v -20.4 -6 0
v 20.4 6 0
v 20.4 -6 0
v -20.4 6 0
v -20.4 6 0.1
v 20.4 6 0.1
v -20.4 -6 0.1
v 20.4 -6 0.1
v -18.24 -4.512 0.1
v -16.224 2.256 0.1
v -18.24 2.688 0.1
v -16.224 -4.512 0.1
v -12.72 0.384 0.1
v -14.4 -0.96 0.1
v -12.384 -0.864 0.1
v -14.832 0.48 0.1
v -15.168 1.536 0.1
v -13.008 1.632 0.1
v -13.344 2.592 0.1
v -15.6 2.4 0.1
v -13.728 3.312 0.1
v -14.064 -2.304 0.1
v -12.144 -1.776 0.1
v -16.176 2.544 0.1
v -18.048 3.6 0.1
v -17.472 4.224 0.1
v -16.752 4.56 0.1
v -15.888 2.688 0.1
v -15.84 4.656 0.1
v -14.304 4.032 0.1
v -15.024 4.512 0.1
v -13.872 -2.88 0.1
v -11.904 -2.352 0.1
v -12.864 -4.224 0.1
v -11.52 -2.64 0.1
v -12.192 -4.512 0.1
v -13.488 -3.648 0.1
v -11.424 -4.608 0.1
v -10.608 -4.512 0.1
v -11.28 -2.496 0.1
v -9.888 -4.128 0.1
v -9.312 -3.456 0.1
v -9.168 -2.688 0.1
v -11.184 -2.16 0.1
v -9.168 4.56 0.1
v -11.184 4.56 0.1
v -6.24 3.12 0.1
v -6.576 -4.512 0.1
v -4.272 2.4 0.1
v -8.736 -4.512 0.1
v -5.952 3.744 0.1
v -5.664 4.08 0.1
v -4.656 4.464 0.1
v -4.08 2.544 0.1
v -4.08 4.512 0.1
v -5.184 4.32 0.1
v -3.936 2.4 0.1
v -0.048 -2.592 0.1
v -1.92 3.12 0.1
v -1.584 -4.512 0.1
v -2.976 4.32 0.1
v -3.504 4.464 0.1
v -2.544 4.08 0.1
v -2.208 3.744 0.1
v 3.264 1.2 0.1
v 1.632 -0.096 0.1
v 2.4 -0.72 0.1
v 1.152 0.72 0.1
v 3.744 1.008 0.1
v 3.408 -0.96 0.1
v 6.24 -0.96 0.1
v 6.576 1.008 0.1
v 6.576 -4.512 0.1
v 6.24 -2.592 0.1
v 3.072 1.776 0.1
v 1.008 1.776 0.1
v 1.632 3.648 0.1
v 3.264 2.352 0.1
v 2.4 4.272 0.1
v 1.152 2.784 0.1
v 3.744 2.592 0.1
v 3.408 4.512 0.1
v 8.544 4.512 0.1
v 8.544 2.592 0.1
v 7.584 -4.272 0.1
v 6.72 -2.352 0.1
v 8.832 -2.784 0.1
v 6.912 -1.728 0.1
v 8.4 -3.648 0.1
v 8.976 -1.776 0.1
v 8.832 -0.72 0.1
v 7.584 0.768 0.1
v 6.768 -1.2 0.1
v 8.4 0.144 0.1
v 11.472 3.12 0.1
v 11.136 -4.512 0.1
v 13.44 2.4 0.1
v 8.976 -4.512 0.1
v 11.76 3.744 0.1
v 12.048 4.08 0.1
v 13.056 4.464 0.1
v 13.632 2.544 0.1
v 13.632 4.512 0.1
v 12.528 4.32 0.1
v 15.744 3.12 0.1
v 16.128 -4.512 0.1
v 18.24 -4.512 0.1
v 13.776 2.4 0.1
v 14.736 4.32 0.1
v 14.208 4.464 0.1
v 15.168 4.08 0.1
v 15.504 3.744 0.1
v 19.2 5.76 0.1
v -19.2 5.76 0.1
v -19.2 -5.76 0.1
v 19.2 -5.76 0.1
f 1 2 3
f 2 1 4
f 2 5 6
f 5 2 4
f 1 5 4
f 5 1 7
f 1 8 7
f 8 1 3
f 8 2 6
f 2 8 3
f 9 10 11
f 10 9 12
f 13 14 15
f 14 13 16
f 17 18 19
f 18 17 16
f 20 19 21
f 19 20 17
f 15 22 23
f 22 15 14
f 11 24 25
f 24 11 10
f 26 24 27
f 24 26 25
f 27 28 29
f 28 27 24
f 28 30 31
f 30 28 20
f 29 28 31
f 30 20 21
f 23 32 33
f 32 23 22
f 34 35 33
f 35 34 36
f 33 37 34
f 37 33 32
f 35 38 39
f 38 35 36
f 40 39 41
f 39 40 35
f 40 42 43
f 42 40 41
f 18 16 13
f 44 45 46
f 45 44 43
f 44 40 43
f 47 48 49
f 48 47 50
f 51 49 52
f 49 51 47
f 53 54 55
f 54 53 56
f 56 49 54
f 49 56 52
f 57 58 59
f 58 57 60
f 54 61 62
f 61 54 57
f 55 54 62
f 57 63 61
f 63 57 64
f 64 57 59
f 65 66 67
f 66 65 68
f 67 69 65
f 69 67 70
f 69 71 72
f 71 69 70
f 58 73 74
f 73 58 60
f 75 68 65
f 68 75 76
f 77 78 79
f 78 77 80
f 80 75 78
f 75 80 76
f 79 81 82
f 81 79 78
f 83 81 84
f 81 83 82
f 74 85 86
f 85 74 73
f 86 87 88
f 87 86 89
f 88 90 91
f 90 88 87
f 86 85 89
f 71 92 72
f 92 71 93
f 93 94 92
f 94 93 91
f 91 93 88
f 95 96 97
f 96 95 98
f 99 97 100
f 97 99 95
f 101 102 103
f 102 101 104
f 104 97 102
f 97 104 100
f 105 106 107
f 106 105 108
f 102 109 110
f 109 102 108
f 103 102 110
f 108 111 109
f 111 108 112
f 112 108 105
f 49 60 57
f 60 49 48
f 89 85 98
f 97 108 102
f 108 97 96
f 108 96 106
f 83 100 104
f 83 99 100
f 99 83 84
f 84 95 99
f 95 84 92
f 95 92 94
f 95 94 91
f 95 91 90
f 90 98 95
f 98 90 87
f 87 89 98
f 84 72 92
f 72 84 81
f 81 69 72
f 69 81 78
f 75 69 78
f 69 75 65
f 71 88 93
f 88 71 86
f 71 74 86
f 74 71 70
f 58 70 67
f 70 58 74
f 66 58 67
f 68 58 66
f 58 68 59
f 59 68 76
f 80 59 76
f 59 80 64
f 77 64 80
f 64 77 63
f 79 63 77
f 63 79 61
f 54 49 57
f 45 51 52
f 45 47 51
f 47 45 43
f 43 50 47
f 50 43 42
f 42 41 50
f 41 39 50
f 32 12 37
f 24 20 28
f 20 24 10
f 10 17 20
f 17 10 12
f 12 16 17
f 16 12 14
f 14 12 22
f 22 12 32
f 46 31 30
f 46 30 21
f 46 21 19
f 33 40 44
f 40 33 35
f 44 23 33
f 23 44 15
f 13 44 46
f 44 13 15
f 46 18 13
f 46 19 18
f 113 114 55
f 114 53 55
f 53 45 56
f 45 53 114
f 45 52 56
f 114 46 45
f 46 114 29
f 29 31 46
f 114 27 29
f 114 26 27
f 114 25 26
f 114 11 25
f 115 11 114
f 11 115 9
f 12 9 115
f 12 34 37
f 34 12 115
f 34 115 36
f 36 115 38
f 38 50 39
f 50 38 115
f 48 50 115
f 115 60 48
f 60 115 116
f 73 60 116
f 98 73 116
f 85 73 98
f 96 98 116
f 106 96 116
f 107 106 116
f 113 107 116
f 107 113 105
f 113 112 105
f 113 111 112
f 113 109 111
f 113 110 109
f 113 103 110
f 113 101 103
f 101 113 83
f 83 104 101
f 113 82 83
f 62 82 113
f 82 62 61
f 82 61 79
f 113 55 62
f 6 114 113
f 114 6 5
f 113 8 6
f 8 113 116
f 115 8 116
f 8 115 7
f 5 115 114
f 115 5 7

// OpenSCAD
// file: ../p/logo-nasa.scad
use <../lib.scad>
function ldraw_lib__logo_nasa() = [
// 0 Logo NASA Worm Logo
// 0 Name: logo-nasa.dat
// 0 Author: Takeshi Takahashi [RainbowDolphin]
// 0 !LDRAW_ORG Primitive UPDATE 2022-06
// 0 !LICENSE Licensed under CC BY 2.0 and CC BY 4.0 : see CAreadme.txt
// 
// 0 BFC CERTIFY CCW
  [0,"BFC","CERTIFY"],
  [0,"BFC","CCW"],
// 
// 0 !HISTORY 2022-04-22 [RainbowDolphin] Pattern extracted and resized from 10202p02 by Orion Pobursky [OrionP]
// 0 !HISTORY 2022-12-20 [PTadmin] Official Update 2022-06
// 
// 
// 4 16 -38 0 -9.4 -33.8 0 -9.4 -33.8 0 4.7 -38 0 5.6
  [4,16,-38,0,-9.4,-33.8,0,-9.4,-33.8,0,4.7,-38,0,5.6],
// 4 16 -26.5 0 .8 -30.9 0 1 -30 0 -2 -25.8 0 -1.8
  [4,16,-26.5,0,.8,-30.9,0,1,-30,0,-2,-25.8,0,-1.8],
// 4 16 -31.6 0 3.2 -30.9 0 1 -27.1 0 3.4 -27.8 0 5.4
  [4,16,-31.6,0,3.2,-30.9,0,1,-27.1,0,3.4,-27.8,0,5.4],
// 4 16 -32.5 0 5 -31.6 0 3.2 -27.8 0 5.4 -28.6 0 6.9
  [4,16,-32.5,0,5,-31.6,0,3.2,-27.8,0,5.4,-28.6,0,6.9],
// 4 16 -25.8 0 -1.8 -30 0 -2 -29.3 0 -4.8 -25.3 0 -3.7
  [4,16,-25.8,0,-1.8,-30,0,-2,-29.3,0,-4.8,-25.3,0,-3.7],
// 4 16 -33.7 0 5.3 -37.6 0 7.5 -38 0 5.6 -33.8 0 4.7
  [4,16,-33.7,0,5.3,-37.6,0,7.5,-38,0,5.6,-33.8,0,4.7],
// 4 16 -36.4 0 8.8 -37.6 0 7.5 -33.7 0 5.3 -34.9 0 9.5
  [4,16,-36.4,0,8.8,-37.6,0,7.5,-33.7,0,5.3,-34.9,0,9.5],
// 4 16 -34.9 0 9.5 -33.7 0 5.3 -33.1 0 5.6 -33 0 9.7
  [4,16,-34.9,0,9.5,-33.7,0,5.3,-33.1,0,5.6,-33,0,9.7],
// 4 16 -33.1 0 5.6 -32.5 0 5 -29.8 0 8.4 -31.3 0 9.4
  [4,16,-33.1,0,5.6,-32.5,0,5,-29.8,0,8.4,-31.3,0,9.4],
// 3 16 -33 0 9.7 -33.1 0 5.6 -31.3 0 9.4
  [3,16,-33,0,9.7,-33.1,0,5.6,-31.3,0,9.4],
// 3 16 -29.8 0 8.4 -32.5 0 5 -28.6 0 6.9
  [3,16,-29.8,0,8.4,-32.5,0,5,-28.6,0,6.9],
// 4 16 -25.3 0 -3.7 -29.3 0 -4.8 -28.9 0 -6 -24.8 0 -4.9
  [4,16,-25.3,0,-3.7,-29.3,0,-4.8,-28.9,0,-6,-24.8,0,-4.9],
// 4 16 -26.8 0 -8.8 -25.4 0 -9.4 -24 0 -5.5 -24.8 0 -4.9
  [4,16,-26.8,0,-8.8,-25.4,0,-9.4,-24,0,-5.5,-24.8,0,-4.9],
// 4 16 -28.1 0 -7.6 -26.8 0 -8.8 -24.8 0 -4.9 -28.9 0 -6
  [4,16,-28.1,0,-7.6,-26.8,0,-8.8,-24.8,0,-4.9,-28.9,0,-6],
// 4 16 -24 0 -5.5 -25.4 0 -9.4 -23.8 0 -9.6 -22.1 0 -9.4
  [4,16,-24,0,-5.5,-25.4,0,-9.4,-23.8,0,-9.6,-22.1,0,-9.4],
// 4 16 -23.5 0 -5.2 -24 0 -5.5 -22.1 0 -9.4 -20.6 0 -8.6
  [4,16,-23.5,0,-5.2,-24,0,-5.5,-22.1,0,-9.4,-20.6,0,-8.6],
// 4 16 -23.5 0 -5.2 -20.6 0 -8.6 -19.4 0 -7.2 -19.1 0 -5.6
  [4,16,-23.5,0,-5.2,-20.6,0,-8.6,-19.4,0,-7.2,-19.1,0,-5.6],
// 3 16 -27.1 0 3.4 -30.9 0 1 -26.5 0 .8
  [3,16,-27.1,0,3.4,-30.9,0,1,-26.5,0,.8],
// 4 16 -19.1 0 9.5 -23.3 0 9.5 -23.3 0 -4.5 -19.1 0 -5.6
  [4,16,-19.1,0,9.5,-23.3,0,9.5,-23.3,0,-4.5,-19.1,0,-5.6],
// 3 16 -23.3 0 -4.5 -23.5 0 -5.2 -19.1 0 -5.6
  [3,16,-23.3,0,-4.5,-23.5,0,-5.2,-19.1,0,-5.6],
// 4 16 -13 0 6.5 -18.2 0 -9.4 -13.7 0 -9.4 -8.9 0 5
  [4,16,-13,0,6.5,-18.2,0,-9.4,-13.7,0,-9.4,-8.9,0,5],
// 4 16 -8.9 0 5 -11.8 0 8.5 -12.4 0 7.8 -13 0 6.5
  [4,16,-8.9,0,5,-11.8,0,8.5,-12.4,0,7.8,-13,0,6.5],
// 4 16 -9.7 0 9.3 -10.8 0 9 -8.5 0 5.3 -8.5 0 9.4
  [4,16,-9.7,0,9.3,-10.8,0,9,-8.5,0,5.3,-8.5,0,9.4],
// 4 16 -10.8 0 9 -11.8 0 8.5 -8.9 0 5 -8.5 0 5.3
  [4,16,-10.8,0,9,-11.8,0,8.5,-8.9,0,5,-8.5,0,5.3],
// 4 16 -3.3 0 -9.4 -.1 0 -5.4 -4 0 6.5 -8.2 0 5
  [4,16,-3.3,0,-9.4,-.1,0,-5.4,-4,0,6.5,-8.2,0,5],
// 4 16 -6.2 0 9 -7.3 0 9.3 -8.5 0 5.3 -8.2 0 5
  [4,16,-6.2,0,9,-7.3,0,9.3,-8.5,0,5.3,-8.2,0,5],
// 3 16 -8.5 0 9.4 -8.5 0 5.3 -7.3 0 9.3
  [3,16,-8.5,0,9.4,-8.5,0,5.3,-7.3,0,9.3],
// 4 16 -8.2 0 5 -4.6 0 7.8 -5.3 0 8.5 -6.2 0 9
  [4,16,-8.2,0,5,-4.6,0,7.8,-5.3,0,8.5,-6.2,0,9],
// 3 16 -4.6 0 7.8 -8.2 0 5 -4 0 6.5
  [3,16,-4.6,0,7.8,-8.2,0,5,-4,0,6.5],
// 4 16 6.8 0 2.5 2.4 0 1.5 3.4 0 -.2 5 0 -1.5
  [4,16,6.8,0,2.5,2.4,0,1.5,3.4,0,-.2,5,0,-1.5],
// 4 16 5 0 -1.5 7.1 0 -2 7.8 0 2.1 6.8 0 2.5
  [4,16,5,0,-1.5,7.1,0,-2,7.8,0,2.1,6.8,0,2.5],
// 4 16 7.8 0 2.1 7.1 0 -2 13 0 -2 13.7 0 2.1
  [4,16,7.8,0,2.1,7.1,0,-2,13,0,-2,13.7,0,2.1],
// 4 16 13 0 -5.4 -.1 0 -5.4 -3.3 0 -9.4 13.7 0 -9.4
  [4,16,13,0,-5.4,-.1,0,-5.4,-3.3,0,-9.4,13.7,0,-9.4],
// 4 16 2.4 0 1.5 6.8 0 2.5 6.4 0 3.7 2.1 0 3.7
  [4,16,2.4,0,1.5,6.8,0,2.5,6.4,0,3.7,2.1,0,3.7],
// 4 16 3.4 0 7.6 2.4 0 5.8 6.8 0 4.9 5 0 8.9
  [4,16,3.4,0,7.6,2.4,0,5.8,6.8,0,4.9,5,0,8.9],
// 4 16 2.4 0 5.8 2.1 0 3.7 6.4 0 3.7 6.8 0 4.9
  [4,16,2.4,0,5.8,2.1,0,3.7,6.4,0,3.7,6.8,0,4.9],
// 4 16 5 0 8.9 6.8 0 4.9 7.8 0 5.4 7.1 0 9.4
  [4,16,5,0,8.9,6.8,0,4.9,7.8,0,5.4,7.1,0,9.4],
// 4 16 17.8 0 9.4 7.1 0 9.4 7.8 0 5.4 17.8 0 5.4
  [4,16,17.8,0,9.4,7.1,0,9.4,7.8,0,5.4,17.8,0,5.4],
// 4 16 15.8 0 -8.9 14 0 -4.9 13 0 -5.4 13.7 0 -9.4
  [4,16,15.8,0,-8.9,14,0,-4.9,13,0,-5.4,13.7,0,-9.4],
// 4 16 18.4 0 -5.8 14.4 0 -3.6 14 0 -4.9 17.5 0 -7.6
  [4,16,18.4,0,-5.8,14.4,0,-3.6,14,0,-4.9,17.5,0,-7.6],
// 4 16 14.4 0 -3.6 18.4 0 -5.8 18.7 0 -3.7 18.4 0 -1.5
  [4,16,14.4,0,-3.6,18.4,0,-5.8,18.7,0,-3.7,18.4,0,-1.5],
// 3 16 14 0 -4.9 15.8 0 -8.9 17.5 0 -7.6
  [3,16,14,0,-4.9,15.8,0,-8.9,17.5,0,-7.6],
// 4 16 13 0 -2 14.1 0 -2.5 15.8 0 1.6 13.7 0 2.1
  [4,16,13,0,-2,14.1,0,-2.5,15.8,0,1.6,13.7,0,2.1],
// 4 16 17.5 0 .3 15.8 0 1.6 14.1 0 -2.5 18.4 0 -1.5
  [4,16,17.5,0,.3,15.8,0,1.6,14.1,0,-2.5,18.4,0,-1.5],
// 3 16 18.4 0 -1.5 14.1 0 -2.5 14.4 0 -3.6
  [3,16,18.4,0,-1.5,14.1,0,-2.5,14.4,0,-3.6],
// 4 16 23.9 0 6.5 18.7 0 -9.4 23.2 0 -9.4 28 0 5
  [4,16,23.9,0,6.5,18.7,0,-9.4,23.2,0,-9.4,28,0,5],
// 4 16 28 0 5 25.1 0 8.5 24.5 0 7.8 23.9 0 6.5
  [4,16,28,0,5,25.1,0,8.5,24.5,0,7.8,23.9,0,6.5],
// 4 16 27.2 0 9.3 26.1 0 9 28.4 0 5.3 28.4 0 9.4
  [4,16,27.2,0,9.3,26.1,0,9,28.4,0,5.3,28.4,0,9.4],
// 4 16 26.1 0 9 25.1 0 8.5 28 0 5 28.4 0 5.3
  [4,16,26.1,0,9,25.1,0,8.5,28,0,5,28.4,0,5.3],
// 4 16 33.6 0 -9.4 38 0 -9.4 32.8 0 6.5 28.7 0 5
  [4,16,33.6,0,-9.4,38,0,-9.4,32.8,0,6.5,28.7,0,5],
// 4 16 30.7 0 9 29.6 0 9.3 28.4 0 5.3 28.7 0 5
  [4,16,30.7,0,9,29.6,0,9.3,28.4,0,5.3,28.7,0,5],
// 3 16 28.4 0 9.4 28.4 0 5.3 29.6 0 9.3
  [3,16,28.4,0,9.4,28.4,0,5.3,29.6,0,9.3],
// 4 16 28.7 0 5 32.299 0 7.8 31.6 0 8.5 30.7 0 9
  [4,16,28.7,0,5,32.299,0,7.8,31.6,0,8.5,30.7,0,9],
// 3 16 32.299 0 7.8 28.7 0 5 32.8 0 6.5
  [3,16,32.299,0,7.8,28.7,0,5,32.8,0,6.5],
];
makepoly(ldraw_lib__logo_nasa(), line=0.2);
// file: ../p/logo-nasa-bg.scad
use <../lib.scad>
function ldraw_lib__logo_nasa_bg() = [
// 0 Logo NASA Worm Logo Background
// 0 Name: logo-nasa-bg.dat
// 0 Author: Takeshi Takahashi [RainbowDolphin]
// 0 !LDRAW_ORG Primitive UPDATE 2022-06
// 0 !LICENSE Licensed under CC BY 2.0 and CC BY 4.0 : see CAreadme.txt
// 
// 0 BFC CERTIFY CCW
  [0,"BFC","CERTIFY"],
  [0,"BFC","CCW"],
// 
// 0 !HISTORY 2022-04-22 [RainbowDolphin] Pattern extracted and resized from 10202p02 by Orion Pobursky [OrionP]
// 0 !HISTORY 2022-12-20 [PTadmin] Official Update 2022-06
// 
// 
// 4 16 -13.7 0 -9.4 -3.3 0 -9.4 -8.2 0 5 -8.9 0 5
  [4,16,-13.7,0,-9.4,-3.3,0,-9.4,-8.2,0,5,-8.9,0,5],
// 3 16 17.5 0 -7.6 15.8 0 -8.9 18.7 0 -9.4
  [3,16,17.5,0,-7.6,15.8,0,-8.9,18.7,0,-9.4],
// 4 16 28.7 0 5 28.4 0 5.3 28 0 5 23.2 0 -9.4
  [4,16,28.7,0,5,28.4,0,5.3,28,0,5,23.2,0,-9.4],
// 3 16 28.7 0 5 23.2 0 -9.4 33.6 0 -9.4
  [3,16,28.7,0,5,23.2,0,-9.4,33.6,0,-9.4],
// 3 16 17.8 0 9.4 25.1 0 8.5 26.1 0 9
  [3,16,17.8,0,9.4,25.1,0,8.5,26.1,0,9],
// 4 16 24.5 0 7.8 25.1 0 8.5 17.8 0 9.4 17.8 0 5.4
  [4,16,24.5,0,7.8,25.1,0,8.5,17.8,0,9.4,17.8,0,5.4],
// 4 16 23.9 0 6.5 24.5 0 7.8 17.8 0 5.4 15.8 0 1.6
  [4,16,23.9,0,6.5,24.5,0,7.8,17.8,0,5.4,15.8,0,1.6],
// 3 16 23.9 0 6.5 15.8 0 1.6 17.5 0 0.3
  [3,16,23.9,0,6.5,15.8,0,1.6,17.5,0,0.3],
// 3 16 23.9 0 6.5 17.5 0 0.3 18.4 0 -1.5
  [3,16,23.9,0,6.5,17.5,0,0.3,18.4,0,-1.5],
// 3 16 23.9 0 6.5 18.4 0 -1.5 18.7 0 -3.7
  [3,16,23.9,0,6.5,18.4,0,-1.5,18.7,0,-3.7],
// 4 16 23.9 0 6.5 18.7 0 -3.7 18.4 0 -5.8 18.7 0 -9.4
  [4,16,23.9,0,6.5,18.7,0,-3.7,18.4,0,-5.8,18.7,0,-9.4],
// 3 16 18.4 0 -5.8 17.5 0 -7.6 18.7 0 -9.4
  [3,16,18.4,0,-5.8,17.5,0,-7.6,18.7,0,-9.4],
// 4 16 13.7 0 2.1 15.8 0 1.6 17.8 0 5.4 7.8 0 5.4
  [4,16,13.7,0,2.1,15.8,0,1.6,17.8,0,5.4,7.8,0,5.4],
// 4 16 7.8 0 2.1 13.7 0 2.1 7.8 0 5.4 6.8 0 4.9
  [4,16,7.8,0,2.1,13.7,0,2.1,7.8,0,5.4,6.8,0,4.9],
// 4 16 6.8 0 2.5 7.8 0 2.1 6.8 0 4.9 6.4 0 3.7
  [4,16,6.8,0,2.5,7.8,0,2.1,6.8,0,4.9,6.4,0,3.7],
// 4 16 14 0 -4.9 14.4 0 -3.6 14.1 0 -2.5 13 0 -2
  [4,16,14,0,-4.9,14.4,0,-3.6,14.1,0,-2.5,13,0,-2],
// 4 16 13 0 -5.4 14 0 -4.9 13 0 -2 7.1 0 -2
  [4,16,13,0,-5.4,14,0,-4.9,13,0,-2,7.1,0,-2],
// 4 16 -0.1 0 -5.4 13 0 -5.4 7.1 0 -2 5 0 -1.5
  [4,16,-0.1,0,-5.4,13,0,-5.4,7.1,0,-2,5,0,-1.5],
// 3 16 3.4 0 -0.2 -0.1 0 -5.4 5 0 -1.5
  [3,16,3.4,0,-0.2,-0.1,0,-5.4,5,0,-1.5],
// 4 16 2.4 0 1.5 -4 0 6.5 -0.1 0 -5.4 3.4 0 -0.2
  [4,16,2.4,0,1.5,-4,0,6.5,-0.1,0,-5.4,3.4,0,-0.2],
// 3 16 -4 0 6.5 2.4 0 1.5 2.1 0 3.7
  [3,16,-4,0,6.5,2.4,0,1.5,2.1,0,3.7],
// 4 16 -4 0 6.5 2.1 0 3.7 2.4 0 5.8 -4.6 0 7.8
  [4,16,-4,0,6.5,2.1,0,3.7,2.4,0,5.8,-4.6,0,7.8],
// 4 16 -4.6 0 7.8 2.4 0 5.8 3.4 0 7.6 -5.3 0 8.5
  [4,16,-4.6,0,7.8,2.4,0,5.8,3.4,0,7.6,-5.3,0,8.5],
// 4 16 -5.3 0 8.5 3.4 0 7.6 5 0 8.9 -6.2 0 9
  [4,16,-5.3,0,8.5,3.4,0,7.6,5,0,8.9,-6.2,0,9],
// 3 16 -8.5 0 5.3 -8.9 0 5 -8.2 0 5
  [3,16,-8.5,0,5.3,-8.9,0,5,-8.2,0,5],
// 3 16 -19.1 0 9.5 -12.4 0 7.8 -11.8 0 8.5
  [3,16,-19.1,0,9.5,-12.4,0,7.8,-11.8,0,8.5],
// 4 16 -13 0 6.5 -12.4 0 7.8 -19.1 0 9.5 -19.1 0 -5.6
  [4,16,-13,0,6.5,-12.4,0,7.8,-19.1,0,9.5,-19.1,0,-5.6],
// 4 16 -18.2 0 -9.4 -13 0 6.5 -19.1 0 -5.6 -19.4 0 -7.2
  [4,16,-18.2,0,-9.4,-13,0,6.5,-19.1,0,-5.6,-19.4,0,-7.2],
// 3 16 -19.4 0 -7.2 -20.6 0 -8.6 -18.2 0 -9.4
  [3,16,-19.4,0,-7.2,-20.6,0,-8.6,-18.2,0,-9.4],
// 3 16 -20.6 0 -8.6 -22.1 0 -9.4 -18.2 0 -9.4
  [3,16,-20.6,0,-8.6,-22.1,0,-9.4,-18.2,0,-9.4],
// 3 16 -28.9 0 -6 -33.8 0 -9.4 -28.1 0 -7.6
  [3,16,-28.9,0,-6,-33.8,0,-9.4,-28.1,0,-7.6],
// 4 16 -32.5 0 5 -33.1 0 5.6 -33.7 0 5.3 -33.8 0 4.7
  [4,16,-32.5,0,5,-33.1,0,5.6,-33.7,0,5.3,-33.8,0,4.7],
// 4 16 -31.6 0 3.2 -32.5 0 5 -33.8 0 4.7 -33.8 0 -9.4
  [4,16,-31.6,0,3.2,-32.5,0,5,-33.8,0,4.7,-33.8,0,-9.4],
// 4 16 -30.9 0 1 -31.6 0 3.2 -33.8 0 -9.4 -30 0 -2
  [4,16,-30.9,0,1,-31.6,0,3.2,-33.8,0,-9.4,-30,0,-2],
// 3 16 -30 0 -2 -33.8 0 -9.4 -29.3 0 -4.8
  [3,16,-30,0,-2,-33.8,0,-9.4,-29.3,0,-4.8],
// 3 16 -29.3 0 -4.8 -33.8 0 -9.4 -28.9 0 -6
  [3,16,-29.3,0,-4.8,-33.8,0,-9.4,-28.9,0,-6],
// 3 16 -23.3 0 9.5 -31.3 0 9.4 -29.8 0 8.4
  [3,16,-23.3,0,9.5,-31.3,0,9.4,-29.8,0,8.4],
// 3 16 -23.3 0 9.5 -29.8 0 8.4 -28.6 0 6.9
  [3,16,-23.3,0,9.5,-29.8,0,8.4,-28.6,0,6.9],
// 3 16 -23.3 0 9.5 -28.6 0 6.9 -27.8 0 5.4
  [3,16,-23.3,0,9.5,-28.6,0,6.9,-27.8,0,5.4],
// 4 16 -24.8 0 -4.9 -24 0 -5.5 -23.5 0 -5.2 -23.3 0 -4.5
  [4,16,-24.8,0,-4.9,-24,0,-5.5,-23.5,0,-5.2,-23.3,0,-4.5],
// 4 16 -25.3 0 -3.7 -24.8 0 -4.9 -23.3 0 -4.5 -25.8 0 -1.8
  [4,16,-25.3,0,-3.7,-24.8,0,-4.9,-23.3,0,-4.5,-25.8,0,-1.8],
// 4 16 -25.8 0 -1.8 -23.3 0 -4.5 -23.3 0 9.5 -26.5 0 0.8
  [4,16,-25.8,0,-1.8,-23.3,0,-4.5,-23.3,0,9.5,-26.5,0,0.8],
// 3 16 -23.3 0 9.5 -27.1 0 3.4 -26.5 0 0.8
  [3,16,-23.3,0,9.5,-27.1,0,3.4,-26.5,0,0.8],
// 3 16 -23.3 0 9.5 -27.8 0 5.4 -27.1 0 3.4
  [3,16,-23.3,0,9.5,-27.8,0,5.4,-27.1,0,3.4],
// 3 16 40 0 12 -40 0 12 -8.5 0 9.4
  [3,16,40,0,12,-40,0,12,-8.5,0,9.4],
// 3 16 -40 0 12 -9.7 0 9.3 -8.5 0 9.4
  [3,16,-40,0,12,-9.7,0,9.3,-8.5,0,9.4],
// 4 16 -10.8 0 9 -9.7 0 9.3 -40 0 12 -19.1 0 9.5
  [4,16,-10.8,0,9,-9.7,0,9.3,-40,0,12,-19.1,0,9.5],
// 3 16 -19.1 0 9.5 -11.8 0 8.5 -10.8 0 9
  [3,16,-19.1,0,9.5,-11.8,0,8.5,-10.8,0,9],
// 4 16 -23.3 0 9.5 -19.1 0 9.5 -40 0 12 -33 0 9.7
  [4,16,-23.3,0,9.5,-19.1,0,9.5,-40,0,12,-33,0,9.7],
// 3 16 -33 0 9.7 -31.3 0 9.4 -23.3 0 9.5
  [3,16,-33,0,9.7,-31.3,0,9.4,-23.3,0,9.5],
// 3 16 -40 0 12 -34.9 0 9.5 -33 0 9.7
  [3,16,-40,0,12,-34.9,0,9.5,-33,0,9.7],
// 3 16 -40 0 12 -36.4 0 8.8 -34.9 0 9.5
  [3,16,-40,0,12,-36.4,0,8.8,-34.9,0,9.5],
// 3 16 -40 0 12 -37.6 0 7.5 -36.4 0 8.8
  [3,16,-40,0,12,-37.6,0,7.5,-36.4,0,8.8],
// 3 16 -40 0 12 -38 0 5.6 -37.6 0 7.5
  [3,16,-40,0,12,-38,0,5.6,-37.6,0,7.5],
// 4 16 -38 0 5.6 -40 0 12 -40 0 -12 -38 0 -9.4
  [4,16,-38,0,5.6,-40,0,12,-40,0,-12,-38,0,-9.4],
// 3 16 -33.8 0 -9.4 -38 0 -9.4 -40 0 -12
  [3,16,-33.8,0,-9.4,-38,0,-9.4,-40,0,-12],
// 4 16 -33.8 0 -9.4 -40 0 -12 -26.8 0 -8.8 -28.1 0 -7.6
  [4,16,-33.8,0,-9.4,-40,0,-12,-26.8,0,-8.8,-28.1,0,-7.6],
// 3 16 -26.8 0 -8.8 -40 0 -12 -25.4 0 -9.4
  [3,16,-26.8,0,-8.8,-40,0,-12,-25.4,0,-9.4],
// 3 16 -25.4 0 -9.4 -40 0 -12 -23.8 0 -9.6
  [3,16,-25.4,0,-9.4,-40,0,-12,-23.8,0,-9.6],
// 4 16 -23.8 0 -9.6 -40 0 -12 -18.2 0 -9.4 -22.1 0 -9.4
  [4,16,-23.8,0,-9.6,-40,0,-12,-18.2,0,-9.4,-22.1,0,-9.4],
// 3 16 -13.7 0 -9.4 -18.2 0 -9.4 -40 0 -12
  [3,16,-13.7,0,-9.4,-18.2,0,-9.4,-40,0,-12],
// 4 16 -3.3 0 -9.4 -13.7 0 -9.4 -40 0 -12 40 0 -12
  [4,16,-3.3,0,-9.4,-13.7,0,-9.4,-40,0,-12,40,0,-12],
// 3 16 13.7 0 -9.4 -3.3 0 -9.4 40 0 -12
  [3,16,13.7,0,-9.4,-3.3,0,-9.4,40,0,-12],
// 3 16 18.7 0 -9.4 13.7 0 -9.4 40 0 -12
  [3,16,18.7,0,-9.4,13.7,0,-9.4,40,0,-12],
// 3 16 15.8 0 -8.9 13.7 0 -9.4 18.7 0 -9.4
  [3,16,15.8,0,-8.9,13.7,0,-9.4,18.7,0,-9.4],
// 3 16 23.2 0 -9.4 18.7 0 -9.4 40 0 -12
  [3,16,23.2,0,-9.4,18.7,0,-9.4,40,0,-12],
// 3 16 33.6 0 -9.4 23.2 0 -9.4 40 0 -12
  [3,16,33.6,0,-9.4,23.2,0,-9.4,40,0,-12],
// 3 16 38 0 -9.4 33.6 0 -9.4 40 0 -12
  [3,16,38,0,-9.4,33.6,0,-9.4,40,0,-12],
// 4 16 38 0 -9.4 40 0 -12 40 0 12 32.8 0 6.5
  [4,16,38,0,-9.4,40,0,-12,40,0,12,32.8,0,6.5],
// 3 16 40 0 12 32.299 0 7.8 32.8 0 6.5
  [3,16,40,0,12,32.299,0,7.8,32.8,0,6.5],
// 3 16 40 0 12 31.6 0 8.5 32.299 0 7.8
  [3,16,40,0,12,31.6,0,8.5,32.299,0,7.8],
// 3 16 40 0 12 30.7 0 9 31.6 0 8.5
  [3,16,40,0,12,30.7,0,9,31.6,0,8.5],
// 3 16 40 0 12 29.6 0 9.3 30.7 0 9
  [3,16,40,0,12,29.6,0,9.3,30.7,0,9],
// 3 16 40 0 12 28.4 0 9.4 29.6 0 9.3
  [3,16,40,0,12,28.4,0,9.4,29.6,0,9.3],
// 4 16 27.2 0 9.3 28.4 0 9.4 40 0 12 17.8 0 9.4
  [4,16,27.2,0,9.3,28.4,0,9.4,40,0,12,17.8,0,9.4],
// 3 16 17.8 0 9.4 26.1 0 9 27.2 0 9.3
  [3,16,17.8,0,9.4,26.1,0,9,27.2,0,9.3],
// 3 16 40 0 12 7.1 0 9.4 17.8 0 9.4
  [3,16,40,0,12,7.1,0,9.4,17.8,0,9.4],
// 4 16 -6.2 0 9 7.1 0 9.4 40 0 12 -7.3 0 9.3
  [4,16,-6.2,0,9,7.1,0,9.4,40,0,12,-7.3,0,9.3],
// 3 16 7.1 0 9.4 -6.2 0 9 5 0 8.9
  [3,16,7.1,0,9.4,-6.2,0,9,5,0,8.9],
// 3 16 40 0 12 -8.5 0 9.4 -7.3 0 9.3
  [3,16,40,0,12,-8.5,0,9.4,-7.3,0,9.3],
];
makepoly(ldraw_lib__logo_nasa_bg(), line=0.2);
// file: ../p/box5-12.scad
use <../lib.scad>
function ldraw_lib__box5_12() = [
// 0 Box with 5 Faces without Any Edges
// 0 Name: box5-12.dat
// 0 Author: Chris Dee [cwdee]
// 0 !LDRAW_ORG Primitive UPDATE 2009-02
// 0 !LICENSE Licensed under CC BY 2.0 and CC BY 4.0 : see CAreadme.txt
// 
// 0 BFC CERTIFY CCW
  [0,"BFC","CERTIFY"],
  [0,"BFC","CCW"],
// 
// 0 !HISTORY 2009-09-03 [PTadmin] Official Update 2009-02
// 
// 
// 4 16 1 1 1 1 1 -1 -1 1 -1 -1 1 1
  [4,16,1,1,1,1,1,-1,-1,1,-1,-1,1,1],
// 4 16 -1 0 1 1 0 1 1 1 1 -1 1 1
  [4,16,-1,0,1,1,0,1,1,1,1,-1,1,1],
// 4 16 -1 0 -1 -1 0 1 -1 1 1 -1 1 -1
  [4,16,-1,0,-1,-1,0,1,-1,1,1,-1,1,-1],
// 4 16 1 0 -1 -1 0 -1 -1 1 -1 1 1 -1
  [4,16,1,0,-1,-1,0,-1,-1,1,-1,1,1,-1],
// 4 16 1 0 1 1 0 -1 1 1 -1 1 1 1
  [4,16,1,0,1,1,0,-1,1,1,-1,1,1,1],
// 0
];
makepoly(ldraw_lib__box5_12(), line=0.2);
// main file
use <../lib.scad>
use <../p/box5-12.scad>
use <../p/logo-nasa-bg.scad>
use <../p/logo-nasa.scad>
function ldraw_lib__163345a() = [
// 0 Sticker  1.5 x  5.1 with Dark Grey NASA Worm Logo
// 0 Name: 163345a.dat
// 0 Author: Takeshi Takahashi [RainbowDolphin]
// 0 !LDRAW_ORG Part UPDATE 2022-06
// 0 !LICENSE Licensed under CC BY 2.0 and CC BY 4.0 : see CAreadme.txt
// 
// 0 BFC CERTIFY CCW
  [0,"BFC","CERTIFY"],
  [0,"BFC","CCW"],
// 
// 0 !KEYWORDS Bricklink 1682stk01, Brickowl 849575, Rebrickable 163345, Rocket
// 0 !KEYWORDS Set 1682, Space Shuttle, Tank
// 
// 0 !HISTORY 2022-12-20 [PTadmin] Official Update 2022-06
// 
// 
// 1 16 0 -0.25 0 51 0 0 0 0.25 0 0 0 15 box5-12.dat
  [1,16,0,-0.25,0,51,0,0,0,0.25,0,0,0,15, ldraw_lib__box5_12()],
// 0 BFC NOCLIP
  [0,"BFC","NOCLIP"],
// 1 8 0 -0.25 0 1.2 0 0 0 1 0 0 0 1.2 logo-nasa.dat
  [1,8,0,-0.25,0,1.2,0,0,0,1,0,0,0,1.2, ldraw_lib__logo_nasa()],
// 0 BFC CLIP
  [0,"BFC","CLIP"],
// 1 16 0 -0.25 0 1.2 0 0 0 1 0 0 0 1.2 logo-nasa-bg.dat
  [1,16,0,-0.25,0,1.2,0,0,0,1,0,0,0,1.2, ldraw_lib__logo_nasa_bg()],
// 4 16 51 -0.25 15 -51 -0.25 15 -48 -0.25 14.4 48 -0.25 14.4
  [4,16,51,-0.25,15,-51,-0.25,15,-48,-0.25,14.4,48,-0.25,14.4],
// 4 16 51 -0.25 15 48 -0.25 14.4 48 -0.25 -14.4 51 -0.25 -15
  [4,16,51,-0.25,15,48,-0.25,14.4,48,-0.25,-14.4,51,-0.25,-15],
// 4 16 51 -0.25 -15 48 -0.25 -14.4 -48 -0.25 -14.4 -51 -0.25 -15
  [4,16,51,-0.25,-15,48,-0.25,-14.4,-48,-0.25,-14.4,-51,-0.25,-15],
// 4 16 -51 -0.25 -15 -48 -0.25 -14.4 -48 -0.25 14.4 -51 -0.25 15
  [4,16,-51,-0.25,-15,-48,-0.25,-14.4,-48,-0.25,14.4,-51,-0.25,15],
];
makepoly(ldraw_lib__163345a(), line=0.2);
